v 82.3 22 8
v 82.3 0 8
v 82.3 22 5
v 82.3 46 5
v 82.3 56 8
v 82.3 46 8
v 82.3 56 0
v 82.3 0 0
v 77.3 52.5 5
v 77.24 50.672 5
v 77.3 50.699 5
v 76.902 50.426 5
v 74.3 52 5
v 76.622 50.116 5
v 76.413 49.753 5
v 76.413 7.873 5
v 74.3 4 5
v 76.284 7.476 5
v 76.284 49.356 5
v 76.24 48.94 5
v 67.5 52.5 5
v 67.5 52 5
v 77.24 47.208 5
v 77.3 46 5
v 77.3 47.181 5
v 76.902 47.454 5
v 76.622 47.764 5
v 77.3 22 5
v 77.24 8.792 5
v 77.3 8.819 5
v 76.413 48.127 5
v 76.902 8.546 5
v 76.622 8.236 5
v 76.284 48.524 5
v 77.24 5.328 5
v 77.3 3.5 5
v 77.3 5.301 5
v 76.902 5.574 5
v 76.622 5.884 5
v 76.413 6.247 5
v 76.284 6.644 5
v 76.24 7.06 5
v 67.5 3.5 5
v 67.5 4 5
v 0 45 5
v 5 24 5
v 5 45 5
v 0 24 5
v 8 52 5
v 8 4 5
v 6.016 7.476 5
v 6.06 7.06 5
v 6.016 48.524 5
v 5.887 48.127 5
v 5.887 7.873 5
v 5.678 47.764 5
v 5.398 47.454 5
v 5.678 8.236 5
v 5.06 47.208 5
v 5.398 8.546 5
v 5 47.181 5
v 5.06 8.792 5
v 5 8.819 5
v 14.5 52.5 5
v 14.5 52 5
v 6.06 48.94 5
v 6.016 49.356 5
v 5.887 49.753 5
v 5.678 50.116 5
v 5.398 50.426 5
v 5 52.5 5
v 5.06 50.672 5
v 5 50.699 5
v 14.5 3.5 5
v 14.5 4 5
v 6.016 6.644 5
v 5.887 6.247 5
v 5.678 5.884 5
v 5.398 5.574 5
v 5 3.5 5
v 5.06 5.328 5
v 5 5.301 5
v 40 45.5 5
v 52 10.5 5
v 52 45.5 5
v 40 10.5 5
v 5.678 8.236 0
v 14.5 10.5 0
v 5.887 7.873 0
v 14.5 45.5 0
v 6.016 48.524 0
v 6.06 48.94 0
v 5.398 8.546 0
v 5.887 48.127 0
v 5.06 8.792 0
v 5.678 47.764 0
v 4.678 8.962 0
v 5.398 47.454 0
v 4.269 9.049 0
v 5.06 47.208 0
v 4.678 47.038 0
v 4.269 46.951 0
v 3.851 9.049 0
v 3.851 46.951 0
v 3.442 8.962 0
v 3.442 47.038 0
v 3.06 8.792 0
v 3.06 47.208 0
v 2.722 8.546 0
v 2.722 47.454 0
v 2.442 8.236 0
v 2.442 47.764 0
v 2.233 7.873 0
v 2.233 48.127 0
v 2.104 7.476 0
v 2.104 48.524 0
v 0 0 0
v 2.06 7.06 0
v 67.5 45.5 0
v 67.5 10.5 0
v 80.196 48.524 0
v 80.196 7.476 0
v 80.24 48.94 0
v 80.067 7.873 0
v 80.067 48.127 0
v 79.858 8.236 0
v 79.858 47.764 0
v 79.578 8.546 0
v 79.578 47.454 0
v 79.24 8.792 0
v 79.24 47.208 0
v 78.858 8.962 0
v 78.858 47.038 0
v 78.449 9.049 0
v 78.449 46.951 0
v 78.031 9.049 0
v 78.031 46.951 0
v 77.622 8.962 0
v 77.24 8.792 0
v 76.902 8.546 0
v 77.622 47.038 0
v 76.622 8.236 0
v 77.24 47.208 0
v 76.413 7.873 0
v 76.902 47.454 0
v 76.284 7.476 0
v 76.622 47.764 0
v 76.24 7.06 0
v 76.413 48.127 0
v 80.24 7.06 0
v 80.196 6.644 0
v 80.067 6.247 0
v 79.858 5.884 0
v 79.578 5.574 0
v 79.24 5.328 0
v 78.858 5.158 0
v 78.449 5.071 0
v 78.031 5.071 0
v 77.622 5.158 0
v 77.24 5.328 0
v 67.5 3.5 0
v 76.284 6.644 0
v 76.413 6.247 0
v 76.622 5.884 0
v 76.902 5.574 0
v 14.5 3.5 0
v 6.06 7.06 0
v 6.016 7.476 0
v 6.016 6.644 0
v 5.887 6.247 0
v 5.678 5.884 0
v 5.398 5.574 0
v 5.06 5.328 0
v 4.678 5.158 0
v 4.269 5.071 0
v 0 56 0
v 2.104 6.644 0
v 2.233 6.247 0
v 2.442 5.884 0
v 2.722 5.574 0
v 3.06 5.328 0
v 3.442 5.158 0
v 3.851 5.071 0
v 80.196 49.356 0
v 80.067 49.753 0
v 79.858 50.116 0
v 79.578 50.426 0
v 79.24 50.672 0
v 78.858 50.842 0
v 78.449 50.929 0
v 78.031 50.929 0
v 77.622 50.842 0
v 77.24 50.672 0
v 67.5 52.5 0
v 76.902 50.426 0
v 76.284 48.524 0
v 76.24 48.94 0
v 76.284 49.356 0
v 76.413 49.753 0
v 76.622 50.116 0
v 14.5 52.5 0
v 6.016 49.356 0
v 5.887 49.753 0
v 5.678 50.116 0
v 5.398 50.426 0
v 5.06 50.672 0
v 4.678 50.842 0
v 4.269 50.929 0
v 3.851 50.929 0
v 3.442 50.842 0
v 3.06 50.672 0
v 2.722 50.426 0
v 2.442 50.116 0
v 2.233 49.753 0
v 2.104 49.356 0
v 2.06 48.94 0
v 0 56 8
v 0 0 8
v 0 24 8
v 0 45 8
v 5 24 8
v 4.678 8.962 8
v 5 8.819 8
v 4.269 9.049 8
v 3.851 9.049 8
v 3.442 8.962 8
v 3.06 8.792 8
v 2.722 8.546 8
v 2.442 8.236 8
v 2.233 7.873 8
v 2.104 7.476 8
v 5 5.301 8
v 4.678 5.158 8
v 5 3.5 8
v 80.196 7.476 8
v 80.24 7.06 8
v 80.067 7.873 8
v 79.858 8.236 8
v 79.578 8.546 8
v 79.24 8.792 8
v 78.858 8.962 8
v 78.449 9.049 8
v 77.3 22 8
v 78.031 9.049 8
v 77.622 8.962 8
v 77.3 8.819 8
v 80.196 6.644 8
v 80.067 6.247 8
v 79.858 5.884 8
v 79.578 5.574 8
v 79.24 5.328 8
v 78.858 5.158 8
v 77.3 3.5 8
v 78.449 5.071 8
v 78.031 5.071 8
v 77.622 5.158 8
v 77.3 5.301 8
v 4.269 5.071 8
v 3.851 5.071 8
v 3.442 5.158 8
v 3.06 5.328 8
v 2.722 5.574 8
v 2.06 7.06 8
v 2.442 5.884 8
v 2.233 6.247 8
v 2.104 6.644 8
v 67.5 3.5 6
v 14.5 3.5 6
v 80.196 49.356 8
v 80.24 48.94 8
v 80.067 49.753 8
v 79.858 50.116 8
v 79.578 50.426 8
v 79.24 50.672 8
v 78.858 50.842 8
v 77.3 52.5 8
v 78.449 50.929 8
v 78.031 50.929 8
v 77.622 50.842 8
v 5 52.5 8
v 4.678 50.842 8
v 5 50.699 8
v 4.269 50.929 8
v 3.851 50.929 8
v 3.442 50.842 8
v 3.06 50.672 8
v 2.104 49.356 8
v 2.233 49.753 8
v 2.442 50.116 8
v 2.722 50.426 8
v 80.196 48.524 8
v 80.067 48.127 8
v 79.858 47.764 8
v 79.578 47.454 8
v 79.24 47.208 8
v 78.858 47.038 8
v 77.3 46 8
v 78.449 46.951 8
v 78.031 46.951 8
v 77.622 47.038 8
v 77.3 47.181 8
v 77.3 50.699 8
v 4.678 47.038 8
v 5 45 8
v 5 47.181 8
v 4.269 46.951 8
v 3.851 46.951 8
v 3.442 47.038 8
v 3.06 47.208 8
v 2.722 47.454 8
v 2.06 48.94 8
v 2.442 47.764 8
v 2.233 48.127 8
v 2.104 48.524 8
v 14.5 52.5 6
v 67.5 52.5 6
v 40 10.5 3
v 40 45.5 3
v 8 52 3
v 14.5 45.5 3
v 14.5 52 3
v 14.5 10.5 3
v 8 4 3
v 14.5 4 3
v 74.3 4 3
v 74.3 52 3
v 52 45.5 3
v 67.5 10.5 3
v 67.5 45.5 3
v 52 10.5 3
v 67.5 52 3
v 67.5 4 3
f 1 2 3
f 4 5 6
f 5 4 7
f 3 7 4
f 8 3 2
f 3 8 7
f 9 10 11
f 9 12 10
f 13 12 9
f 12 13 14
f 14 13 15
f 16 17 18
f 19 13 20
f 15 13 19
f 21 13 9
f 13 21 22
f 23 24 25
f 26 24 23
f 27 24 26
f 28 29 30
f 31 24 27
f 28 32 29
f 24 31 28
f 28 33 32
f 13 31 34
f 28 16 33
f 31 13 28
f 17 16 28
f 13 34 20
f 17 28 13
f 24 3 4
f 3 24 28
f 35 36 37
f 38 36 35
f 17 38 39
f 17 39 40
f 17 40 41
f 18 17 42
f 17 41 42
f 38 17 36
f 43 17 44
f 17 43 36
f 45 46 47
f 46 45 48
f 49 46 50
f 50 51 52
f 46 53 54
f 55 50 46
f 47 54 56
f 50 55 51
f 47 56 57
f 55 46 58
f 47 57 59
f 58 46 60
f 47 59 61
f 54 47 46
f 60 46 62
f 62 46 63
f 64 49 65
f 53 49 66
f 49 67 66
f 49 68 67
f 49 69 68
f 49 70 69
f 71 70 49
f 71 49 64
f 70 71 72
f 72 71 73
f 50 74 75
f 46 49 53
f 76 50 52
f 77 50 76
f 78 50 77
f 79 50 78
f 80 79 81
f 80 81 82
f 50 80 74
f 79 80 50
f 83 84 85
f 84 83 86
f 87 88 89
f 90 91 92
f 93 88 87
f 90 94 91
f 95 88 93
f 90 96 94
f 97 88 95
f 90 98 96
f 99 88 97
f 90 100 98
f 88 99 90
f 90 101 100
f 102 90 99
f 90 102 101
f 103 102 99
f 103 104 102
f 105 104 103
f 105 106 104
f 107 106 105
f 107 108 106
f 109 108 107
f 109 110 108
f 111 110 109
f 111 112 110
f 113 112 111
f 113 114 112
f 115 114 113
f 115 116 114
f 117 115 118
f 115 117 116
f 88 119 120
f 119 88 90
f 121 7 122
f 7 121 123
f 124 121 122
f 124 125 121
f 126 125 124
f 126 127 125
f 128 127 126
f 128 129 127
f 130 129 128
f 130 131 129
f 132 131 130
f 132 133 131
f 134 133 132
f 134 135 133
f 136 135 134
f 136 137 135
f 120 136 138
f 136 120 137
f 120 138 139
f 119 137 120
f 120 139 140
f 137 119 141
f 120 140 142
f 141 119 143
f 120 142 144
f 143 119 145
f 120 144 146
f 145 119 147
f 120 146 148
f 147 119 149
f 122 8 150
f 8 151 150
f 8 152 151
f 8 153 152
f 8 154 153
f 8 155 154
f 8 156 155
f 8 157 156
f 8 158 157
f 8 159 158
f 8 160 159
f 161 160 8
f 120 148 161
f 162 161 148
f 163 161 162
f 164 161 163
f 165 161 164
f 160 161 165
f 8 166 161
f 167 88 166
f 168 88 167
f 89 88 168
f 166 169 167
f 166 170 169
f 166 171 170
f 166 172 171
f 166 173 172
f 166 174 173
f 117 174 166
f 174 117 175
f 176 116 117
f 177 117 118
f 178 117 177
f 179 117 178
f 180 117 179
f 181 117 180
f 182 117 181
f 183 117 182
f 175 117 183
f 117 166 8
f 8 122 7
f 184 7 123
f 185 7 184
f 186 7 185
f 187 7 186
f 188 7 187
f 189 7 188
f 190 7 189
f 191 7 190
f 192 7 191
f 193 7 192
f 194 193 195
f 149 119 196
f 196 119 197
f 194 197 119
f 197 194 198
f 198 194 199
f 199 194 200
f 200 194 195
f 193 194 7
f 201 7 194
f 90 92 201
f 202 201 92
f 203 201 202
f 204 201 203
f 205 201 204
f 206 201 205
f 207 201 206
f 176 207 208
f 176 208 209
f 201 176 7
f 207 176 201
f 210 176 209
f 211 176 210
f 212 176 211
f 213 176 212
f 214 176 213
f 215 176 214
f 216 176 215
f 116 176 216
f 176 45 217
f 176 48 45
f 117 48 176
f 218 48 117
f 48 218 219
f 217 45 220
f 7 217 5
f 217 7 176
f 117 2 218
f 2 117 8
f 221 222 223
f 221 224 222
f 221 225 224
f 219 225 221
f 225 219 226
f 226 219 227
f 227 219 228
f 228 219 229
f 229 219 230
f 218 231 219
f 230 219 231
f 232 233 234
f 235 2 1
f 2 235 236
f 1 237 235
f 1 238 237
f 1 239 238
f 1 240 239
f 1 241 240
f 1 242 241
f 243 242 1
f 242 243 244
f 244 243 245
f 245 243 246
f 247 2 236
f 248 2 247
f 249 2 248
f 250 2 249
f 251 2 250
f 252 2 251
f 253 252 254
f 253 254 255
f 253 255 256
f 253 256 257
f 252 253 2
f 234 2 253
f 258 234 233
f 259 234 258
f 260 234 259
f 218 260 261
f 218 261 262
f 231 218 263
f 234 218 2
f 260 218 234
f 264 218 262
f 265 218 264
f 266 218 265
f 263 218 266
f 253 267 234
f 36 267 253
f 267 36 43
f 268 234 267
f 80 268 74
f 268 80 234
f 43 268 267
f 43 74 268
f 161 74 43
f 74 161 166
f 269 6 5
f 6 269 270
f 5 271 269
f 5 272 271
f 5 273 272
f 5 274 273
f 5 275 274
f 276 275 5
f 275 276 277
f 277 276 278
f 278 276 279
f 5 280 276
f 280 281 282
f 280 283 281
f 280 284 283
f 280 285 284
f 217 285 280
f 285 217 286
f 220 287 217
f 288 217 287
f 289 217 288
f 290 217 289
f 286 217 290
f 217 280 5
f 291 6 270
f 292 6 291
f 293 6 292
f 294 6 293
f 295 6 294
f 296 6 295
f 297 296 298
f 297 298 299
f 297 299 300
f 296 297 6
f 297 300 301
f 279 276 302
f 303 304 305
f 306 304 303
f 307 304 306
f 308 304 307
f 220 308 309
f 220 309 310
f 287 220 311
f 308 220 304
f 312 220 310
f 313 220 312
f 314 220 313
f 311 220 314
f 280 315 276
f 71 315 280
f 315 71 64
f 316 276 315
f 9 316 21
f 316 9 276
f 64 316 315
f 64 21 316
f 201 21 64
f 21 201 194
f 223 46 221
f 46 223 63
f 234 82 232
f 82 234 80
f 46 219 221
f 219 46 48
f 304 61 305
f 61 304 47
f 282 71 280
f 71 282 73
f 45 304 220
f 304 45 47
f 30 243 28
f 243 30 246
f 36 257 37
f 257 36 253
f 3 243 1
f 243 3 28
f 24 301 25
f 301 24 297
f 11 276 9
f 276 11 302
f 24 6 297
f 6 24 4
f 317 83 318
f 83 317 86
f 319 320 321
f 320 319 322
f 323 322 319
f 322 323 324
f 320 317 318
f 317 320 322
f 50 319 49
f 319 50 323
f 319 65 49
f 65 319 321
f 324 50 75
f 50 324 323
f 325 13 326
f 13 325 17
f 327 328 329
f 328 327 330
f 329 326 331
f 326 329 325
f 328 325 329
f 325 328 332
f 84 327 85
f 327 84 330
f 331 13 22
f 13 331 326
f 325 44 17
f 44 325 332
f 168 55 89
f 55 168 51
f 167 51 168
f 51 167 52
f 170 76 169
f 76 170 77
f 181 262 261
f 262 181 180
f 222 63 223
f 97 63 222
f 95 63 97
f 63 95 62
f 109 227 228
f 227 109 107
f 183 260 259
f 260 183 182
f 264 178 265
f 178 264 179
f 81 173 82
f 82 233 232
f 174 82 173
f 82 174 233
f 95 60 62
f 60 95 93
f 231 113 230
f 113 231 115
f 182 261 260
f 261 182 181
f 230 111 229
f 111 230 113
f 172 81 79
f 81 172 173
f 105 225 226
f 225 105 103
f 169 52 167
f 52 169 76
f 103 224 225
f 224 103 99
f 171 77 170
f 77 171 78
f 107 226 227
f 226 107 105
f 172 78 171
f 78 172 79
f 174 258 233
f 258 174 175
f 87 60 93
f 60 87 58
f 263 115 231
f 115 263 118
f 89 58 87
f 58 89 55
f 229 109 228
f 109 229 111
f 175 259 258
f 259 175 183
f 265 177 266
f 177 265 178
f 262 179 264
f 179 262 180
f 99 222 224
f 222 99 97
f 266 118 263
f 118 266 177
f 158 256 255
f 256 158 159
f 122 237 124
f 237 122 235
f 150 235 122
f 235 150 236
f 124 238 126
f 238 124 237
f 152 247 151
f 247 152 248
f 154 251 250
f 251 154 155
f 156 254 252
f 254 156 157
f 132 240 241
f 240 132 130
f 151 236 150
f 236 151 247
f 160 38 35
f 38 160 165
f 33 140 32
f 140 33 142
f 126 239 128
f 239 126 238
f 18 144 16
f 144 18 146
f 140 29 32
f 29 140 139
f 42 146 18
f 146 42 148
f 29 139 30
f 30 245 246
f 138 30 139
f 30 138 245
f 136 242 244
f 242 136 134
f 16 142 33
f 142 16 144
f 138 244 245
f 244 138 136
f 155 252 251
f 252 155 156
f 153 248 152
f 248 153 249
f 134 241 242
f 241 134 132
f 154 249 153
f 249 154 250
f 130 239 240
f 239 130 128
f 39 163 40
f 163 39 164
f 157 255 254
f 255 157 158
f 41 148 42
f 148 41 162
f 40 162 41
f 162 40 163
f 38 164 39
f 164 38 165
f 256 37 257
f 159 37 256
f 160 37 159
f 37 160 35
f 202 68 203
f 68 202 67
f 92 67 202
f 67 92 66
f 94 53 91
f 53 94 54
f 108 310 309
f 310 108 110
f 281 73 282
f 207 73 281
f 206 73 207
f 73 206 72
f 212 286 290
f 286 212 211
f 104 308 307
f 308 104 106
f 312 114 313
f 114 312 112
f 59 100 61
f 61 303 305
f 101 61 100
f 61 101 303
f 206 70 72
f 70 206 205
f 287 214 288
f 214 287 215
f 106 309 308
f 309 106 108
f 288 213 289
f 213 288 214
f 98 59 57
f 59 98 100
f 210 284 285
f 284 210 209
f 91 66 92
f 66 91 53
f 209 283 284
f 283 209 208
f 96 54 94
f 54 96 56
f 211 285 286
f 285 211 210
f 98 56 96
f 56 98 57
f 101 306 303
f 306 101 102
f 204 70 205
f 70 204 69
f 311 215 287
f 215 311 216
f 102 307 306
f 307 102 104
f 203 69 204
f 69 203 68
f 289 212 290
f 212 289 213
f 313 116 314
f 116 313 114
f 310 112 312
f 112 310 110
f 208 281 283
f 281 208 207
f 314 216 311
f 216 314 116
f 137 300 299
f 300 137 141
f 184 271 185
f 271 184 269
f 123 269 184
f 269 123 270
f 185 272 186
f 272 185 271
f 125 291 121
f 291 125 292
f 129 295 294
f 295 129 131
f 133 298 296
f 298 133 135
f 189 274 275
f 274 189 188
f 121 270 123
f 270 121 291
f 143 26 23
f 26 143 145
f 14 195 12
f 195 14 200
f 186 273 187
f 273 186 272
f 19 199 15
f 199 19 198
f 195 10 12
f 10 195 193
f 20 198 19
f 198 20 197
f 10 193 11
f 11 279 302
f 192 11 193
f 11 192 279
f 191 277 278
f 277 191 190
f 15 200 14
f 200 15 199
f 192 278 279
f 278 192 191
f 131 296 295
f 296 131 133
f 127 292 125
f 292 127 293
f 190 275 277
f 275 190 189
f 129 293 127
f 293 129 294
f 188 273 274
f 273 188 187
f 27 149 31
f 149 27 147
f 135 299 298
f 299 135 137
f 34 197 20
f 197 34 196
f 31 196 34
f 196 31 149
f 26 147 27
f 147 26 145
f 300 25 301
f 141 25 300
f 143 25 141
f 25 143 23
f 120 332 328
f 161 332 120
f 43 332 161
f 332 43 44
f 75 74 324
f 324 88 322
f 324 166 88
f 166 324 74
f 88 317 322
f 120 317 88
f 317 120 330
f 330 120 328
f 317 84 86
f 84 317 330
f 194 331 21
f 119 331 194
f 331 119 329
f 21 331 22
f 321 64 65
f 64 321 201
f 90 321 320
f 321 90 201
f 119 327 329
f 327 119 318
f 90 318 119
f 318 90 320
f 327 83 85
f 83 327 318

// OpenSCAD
// file: Common.scad
// Author   KMS - Martin Dubois, ing.
// Product  FX3-KB
// File     Hardware/Common.scad

// Constants
/////////////////////////////////////////////////////////////////////////////

SizeX_mm = 82.3;
SizeY_mm = 56  ;

// Modules
/////////////////////////////////////////////////////////////////////////////

module LessPlastic()
{
    translate( [                   8, 4, 3 ] ) cube( [ 32  , SizeY_mm - 2 * 4, 5 ] );
    translate( [ SizeX_mm - 22.3 - 8, 4, 3 ] ) cube( [ 22.3, SizeY_mm - 2 * 4, 5 ] );
}

module MountHoles()
{
    union()
    {
        translate( [            4.06,            7.06, -1 ] ) cylinder( r = 2, h = 20, $fs = 0.1 );
        translate( [ SizeX_mm - 4.06,            7.06, -1 ] ) cylinder( r = 2, h = 20, $fs = 0.1 );
        translate( [            4.06, SizeY_mm - 7.06, -1 ] ) cylinder( r = 2, h = 20, $fs = 0.1 );
        translate( [ SizeX_mm - 4.06, SizeY_mm - 7.06, -1 ] ) cylinder( r = 2, h = 20, $fs = 0.1 );
    }
}

module Plate( aZ )
{
    cube( [ SizeX_mm, SizeY_mm, aZ ] );
}
// main file
// Author   KMS - Martin Dubois, ing.
// Product  FX3-KB
// File     Hardware/Base.scad

include <Common.scad>

PlateZ_mm = 5;
SizeZ_mm  = 8;

difference()
{
  union()
  {
    Plate( PlateZ_mm );

    translate( [ 0,              0, PlateZ_mm ] )
      cube( [ SizeX_mm, 3.5, SizeZ_mm - PlateZ_mm ] );
    translate( [ 0, SizeY_mm - 3.5, PlateZ_mm ] )
      cube( [ SizeX_mm, 3.5, SizeZ_mm - PlateZ_mm ] );

    translate( [            0,                3, PlateZ_mm ] )
      cube( [        5, 21, SizeZ_mm - PlateZ_mm ] );
    translate( [            0, SizeY_mm - 8 - 3, PlateZ_mm ] )
      cube( [        5,  8, SizeZ_mm - PlateZ_mm ] );
    translate( [ SizeX_mm - 5,                3, PlateZ_mm ] )
      cube( [        5, 19, SizeZ_mm - PlateZ_mm ] );
    translate( [ SizeX_mm - 5, SizeY_mm - 7 - 3, PlateZ_mm ] )
      cube( [        5,  7, SizeZ_mm - PlateZ_mm ] );
  }

  union()
  {
    LessPlastic();
    MountHoles();

    // Headers
    translate( [ 14.5,                3.5, -1 ] )
      cube( [ 53, 7, PlateZ_mm + 2 ] );
    translate( [ 14.5, SizeY_mm - 7 - 3.5, -1 ] )
      cube( [ 53, 7, PlateZ_mm + 2 ] );
  }
}
